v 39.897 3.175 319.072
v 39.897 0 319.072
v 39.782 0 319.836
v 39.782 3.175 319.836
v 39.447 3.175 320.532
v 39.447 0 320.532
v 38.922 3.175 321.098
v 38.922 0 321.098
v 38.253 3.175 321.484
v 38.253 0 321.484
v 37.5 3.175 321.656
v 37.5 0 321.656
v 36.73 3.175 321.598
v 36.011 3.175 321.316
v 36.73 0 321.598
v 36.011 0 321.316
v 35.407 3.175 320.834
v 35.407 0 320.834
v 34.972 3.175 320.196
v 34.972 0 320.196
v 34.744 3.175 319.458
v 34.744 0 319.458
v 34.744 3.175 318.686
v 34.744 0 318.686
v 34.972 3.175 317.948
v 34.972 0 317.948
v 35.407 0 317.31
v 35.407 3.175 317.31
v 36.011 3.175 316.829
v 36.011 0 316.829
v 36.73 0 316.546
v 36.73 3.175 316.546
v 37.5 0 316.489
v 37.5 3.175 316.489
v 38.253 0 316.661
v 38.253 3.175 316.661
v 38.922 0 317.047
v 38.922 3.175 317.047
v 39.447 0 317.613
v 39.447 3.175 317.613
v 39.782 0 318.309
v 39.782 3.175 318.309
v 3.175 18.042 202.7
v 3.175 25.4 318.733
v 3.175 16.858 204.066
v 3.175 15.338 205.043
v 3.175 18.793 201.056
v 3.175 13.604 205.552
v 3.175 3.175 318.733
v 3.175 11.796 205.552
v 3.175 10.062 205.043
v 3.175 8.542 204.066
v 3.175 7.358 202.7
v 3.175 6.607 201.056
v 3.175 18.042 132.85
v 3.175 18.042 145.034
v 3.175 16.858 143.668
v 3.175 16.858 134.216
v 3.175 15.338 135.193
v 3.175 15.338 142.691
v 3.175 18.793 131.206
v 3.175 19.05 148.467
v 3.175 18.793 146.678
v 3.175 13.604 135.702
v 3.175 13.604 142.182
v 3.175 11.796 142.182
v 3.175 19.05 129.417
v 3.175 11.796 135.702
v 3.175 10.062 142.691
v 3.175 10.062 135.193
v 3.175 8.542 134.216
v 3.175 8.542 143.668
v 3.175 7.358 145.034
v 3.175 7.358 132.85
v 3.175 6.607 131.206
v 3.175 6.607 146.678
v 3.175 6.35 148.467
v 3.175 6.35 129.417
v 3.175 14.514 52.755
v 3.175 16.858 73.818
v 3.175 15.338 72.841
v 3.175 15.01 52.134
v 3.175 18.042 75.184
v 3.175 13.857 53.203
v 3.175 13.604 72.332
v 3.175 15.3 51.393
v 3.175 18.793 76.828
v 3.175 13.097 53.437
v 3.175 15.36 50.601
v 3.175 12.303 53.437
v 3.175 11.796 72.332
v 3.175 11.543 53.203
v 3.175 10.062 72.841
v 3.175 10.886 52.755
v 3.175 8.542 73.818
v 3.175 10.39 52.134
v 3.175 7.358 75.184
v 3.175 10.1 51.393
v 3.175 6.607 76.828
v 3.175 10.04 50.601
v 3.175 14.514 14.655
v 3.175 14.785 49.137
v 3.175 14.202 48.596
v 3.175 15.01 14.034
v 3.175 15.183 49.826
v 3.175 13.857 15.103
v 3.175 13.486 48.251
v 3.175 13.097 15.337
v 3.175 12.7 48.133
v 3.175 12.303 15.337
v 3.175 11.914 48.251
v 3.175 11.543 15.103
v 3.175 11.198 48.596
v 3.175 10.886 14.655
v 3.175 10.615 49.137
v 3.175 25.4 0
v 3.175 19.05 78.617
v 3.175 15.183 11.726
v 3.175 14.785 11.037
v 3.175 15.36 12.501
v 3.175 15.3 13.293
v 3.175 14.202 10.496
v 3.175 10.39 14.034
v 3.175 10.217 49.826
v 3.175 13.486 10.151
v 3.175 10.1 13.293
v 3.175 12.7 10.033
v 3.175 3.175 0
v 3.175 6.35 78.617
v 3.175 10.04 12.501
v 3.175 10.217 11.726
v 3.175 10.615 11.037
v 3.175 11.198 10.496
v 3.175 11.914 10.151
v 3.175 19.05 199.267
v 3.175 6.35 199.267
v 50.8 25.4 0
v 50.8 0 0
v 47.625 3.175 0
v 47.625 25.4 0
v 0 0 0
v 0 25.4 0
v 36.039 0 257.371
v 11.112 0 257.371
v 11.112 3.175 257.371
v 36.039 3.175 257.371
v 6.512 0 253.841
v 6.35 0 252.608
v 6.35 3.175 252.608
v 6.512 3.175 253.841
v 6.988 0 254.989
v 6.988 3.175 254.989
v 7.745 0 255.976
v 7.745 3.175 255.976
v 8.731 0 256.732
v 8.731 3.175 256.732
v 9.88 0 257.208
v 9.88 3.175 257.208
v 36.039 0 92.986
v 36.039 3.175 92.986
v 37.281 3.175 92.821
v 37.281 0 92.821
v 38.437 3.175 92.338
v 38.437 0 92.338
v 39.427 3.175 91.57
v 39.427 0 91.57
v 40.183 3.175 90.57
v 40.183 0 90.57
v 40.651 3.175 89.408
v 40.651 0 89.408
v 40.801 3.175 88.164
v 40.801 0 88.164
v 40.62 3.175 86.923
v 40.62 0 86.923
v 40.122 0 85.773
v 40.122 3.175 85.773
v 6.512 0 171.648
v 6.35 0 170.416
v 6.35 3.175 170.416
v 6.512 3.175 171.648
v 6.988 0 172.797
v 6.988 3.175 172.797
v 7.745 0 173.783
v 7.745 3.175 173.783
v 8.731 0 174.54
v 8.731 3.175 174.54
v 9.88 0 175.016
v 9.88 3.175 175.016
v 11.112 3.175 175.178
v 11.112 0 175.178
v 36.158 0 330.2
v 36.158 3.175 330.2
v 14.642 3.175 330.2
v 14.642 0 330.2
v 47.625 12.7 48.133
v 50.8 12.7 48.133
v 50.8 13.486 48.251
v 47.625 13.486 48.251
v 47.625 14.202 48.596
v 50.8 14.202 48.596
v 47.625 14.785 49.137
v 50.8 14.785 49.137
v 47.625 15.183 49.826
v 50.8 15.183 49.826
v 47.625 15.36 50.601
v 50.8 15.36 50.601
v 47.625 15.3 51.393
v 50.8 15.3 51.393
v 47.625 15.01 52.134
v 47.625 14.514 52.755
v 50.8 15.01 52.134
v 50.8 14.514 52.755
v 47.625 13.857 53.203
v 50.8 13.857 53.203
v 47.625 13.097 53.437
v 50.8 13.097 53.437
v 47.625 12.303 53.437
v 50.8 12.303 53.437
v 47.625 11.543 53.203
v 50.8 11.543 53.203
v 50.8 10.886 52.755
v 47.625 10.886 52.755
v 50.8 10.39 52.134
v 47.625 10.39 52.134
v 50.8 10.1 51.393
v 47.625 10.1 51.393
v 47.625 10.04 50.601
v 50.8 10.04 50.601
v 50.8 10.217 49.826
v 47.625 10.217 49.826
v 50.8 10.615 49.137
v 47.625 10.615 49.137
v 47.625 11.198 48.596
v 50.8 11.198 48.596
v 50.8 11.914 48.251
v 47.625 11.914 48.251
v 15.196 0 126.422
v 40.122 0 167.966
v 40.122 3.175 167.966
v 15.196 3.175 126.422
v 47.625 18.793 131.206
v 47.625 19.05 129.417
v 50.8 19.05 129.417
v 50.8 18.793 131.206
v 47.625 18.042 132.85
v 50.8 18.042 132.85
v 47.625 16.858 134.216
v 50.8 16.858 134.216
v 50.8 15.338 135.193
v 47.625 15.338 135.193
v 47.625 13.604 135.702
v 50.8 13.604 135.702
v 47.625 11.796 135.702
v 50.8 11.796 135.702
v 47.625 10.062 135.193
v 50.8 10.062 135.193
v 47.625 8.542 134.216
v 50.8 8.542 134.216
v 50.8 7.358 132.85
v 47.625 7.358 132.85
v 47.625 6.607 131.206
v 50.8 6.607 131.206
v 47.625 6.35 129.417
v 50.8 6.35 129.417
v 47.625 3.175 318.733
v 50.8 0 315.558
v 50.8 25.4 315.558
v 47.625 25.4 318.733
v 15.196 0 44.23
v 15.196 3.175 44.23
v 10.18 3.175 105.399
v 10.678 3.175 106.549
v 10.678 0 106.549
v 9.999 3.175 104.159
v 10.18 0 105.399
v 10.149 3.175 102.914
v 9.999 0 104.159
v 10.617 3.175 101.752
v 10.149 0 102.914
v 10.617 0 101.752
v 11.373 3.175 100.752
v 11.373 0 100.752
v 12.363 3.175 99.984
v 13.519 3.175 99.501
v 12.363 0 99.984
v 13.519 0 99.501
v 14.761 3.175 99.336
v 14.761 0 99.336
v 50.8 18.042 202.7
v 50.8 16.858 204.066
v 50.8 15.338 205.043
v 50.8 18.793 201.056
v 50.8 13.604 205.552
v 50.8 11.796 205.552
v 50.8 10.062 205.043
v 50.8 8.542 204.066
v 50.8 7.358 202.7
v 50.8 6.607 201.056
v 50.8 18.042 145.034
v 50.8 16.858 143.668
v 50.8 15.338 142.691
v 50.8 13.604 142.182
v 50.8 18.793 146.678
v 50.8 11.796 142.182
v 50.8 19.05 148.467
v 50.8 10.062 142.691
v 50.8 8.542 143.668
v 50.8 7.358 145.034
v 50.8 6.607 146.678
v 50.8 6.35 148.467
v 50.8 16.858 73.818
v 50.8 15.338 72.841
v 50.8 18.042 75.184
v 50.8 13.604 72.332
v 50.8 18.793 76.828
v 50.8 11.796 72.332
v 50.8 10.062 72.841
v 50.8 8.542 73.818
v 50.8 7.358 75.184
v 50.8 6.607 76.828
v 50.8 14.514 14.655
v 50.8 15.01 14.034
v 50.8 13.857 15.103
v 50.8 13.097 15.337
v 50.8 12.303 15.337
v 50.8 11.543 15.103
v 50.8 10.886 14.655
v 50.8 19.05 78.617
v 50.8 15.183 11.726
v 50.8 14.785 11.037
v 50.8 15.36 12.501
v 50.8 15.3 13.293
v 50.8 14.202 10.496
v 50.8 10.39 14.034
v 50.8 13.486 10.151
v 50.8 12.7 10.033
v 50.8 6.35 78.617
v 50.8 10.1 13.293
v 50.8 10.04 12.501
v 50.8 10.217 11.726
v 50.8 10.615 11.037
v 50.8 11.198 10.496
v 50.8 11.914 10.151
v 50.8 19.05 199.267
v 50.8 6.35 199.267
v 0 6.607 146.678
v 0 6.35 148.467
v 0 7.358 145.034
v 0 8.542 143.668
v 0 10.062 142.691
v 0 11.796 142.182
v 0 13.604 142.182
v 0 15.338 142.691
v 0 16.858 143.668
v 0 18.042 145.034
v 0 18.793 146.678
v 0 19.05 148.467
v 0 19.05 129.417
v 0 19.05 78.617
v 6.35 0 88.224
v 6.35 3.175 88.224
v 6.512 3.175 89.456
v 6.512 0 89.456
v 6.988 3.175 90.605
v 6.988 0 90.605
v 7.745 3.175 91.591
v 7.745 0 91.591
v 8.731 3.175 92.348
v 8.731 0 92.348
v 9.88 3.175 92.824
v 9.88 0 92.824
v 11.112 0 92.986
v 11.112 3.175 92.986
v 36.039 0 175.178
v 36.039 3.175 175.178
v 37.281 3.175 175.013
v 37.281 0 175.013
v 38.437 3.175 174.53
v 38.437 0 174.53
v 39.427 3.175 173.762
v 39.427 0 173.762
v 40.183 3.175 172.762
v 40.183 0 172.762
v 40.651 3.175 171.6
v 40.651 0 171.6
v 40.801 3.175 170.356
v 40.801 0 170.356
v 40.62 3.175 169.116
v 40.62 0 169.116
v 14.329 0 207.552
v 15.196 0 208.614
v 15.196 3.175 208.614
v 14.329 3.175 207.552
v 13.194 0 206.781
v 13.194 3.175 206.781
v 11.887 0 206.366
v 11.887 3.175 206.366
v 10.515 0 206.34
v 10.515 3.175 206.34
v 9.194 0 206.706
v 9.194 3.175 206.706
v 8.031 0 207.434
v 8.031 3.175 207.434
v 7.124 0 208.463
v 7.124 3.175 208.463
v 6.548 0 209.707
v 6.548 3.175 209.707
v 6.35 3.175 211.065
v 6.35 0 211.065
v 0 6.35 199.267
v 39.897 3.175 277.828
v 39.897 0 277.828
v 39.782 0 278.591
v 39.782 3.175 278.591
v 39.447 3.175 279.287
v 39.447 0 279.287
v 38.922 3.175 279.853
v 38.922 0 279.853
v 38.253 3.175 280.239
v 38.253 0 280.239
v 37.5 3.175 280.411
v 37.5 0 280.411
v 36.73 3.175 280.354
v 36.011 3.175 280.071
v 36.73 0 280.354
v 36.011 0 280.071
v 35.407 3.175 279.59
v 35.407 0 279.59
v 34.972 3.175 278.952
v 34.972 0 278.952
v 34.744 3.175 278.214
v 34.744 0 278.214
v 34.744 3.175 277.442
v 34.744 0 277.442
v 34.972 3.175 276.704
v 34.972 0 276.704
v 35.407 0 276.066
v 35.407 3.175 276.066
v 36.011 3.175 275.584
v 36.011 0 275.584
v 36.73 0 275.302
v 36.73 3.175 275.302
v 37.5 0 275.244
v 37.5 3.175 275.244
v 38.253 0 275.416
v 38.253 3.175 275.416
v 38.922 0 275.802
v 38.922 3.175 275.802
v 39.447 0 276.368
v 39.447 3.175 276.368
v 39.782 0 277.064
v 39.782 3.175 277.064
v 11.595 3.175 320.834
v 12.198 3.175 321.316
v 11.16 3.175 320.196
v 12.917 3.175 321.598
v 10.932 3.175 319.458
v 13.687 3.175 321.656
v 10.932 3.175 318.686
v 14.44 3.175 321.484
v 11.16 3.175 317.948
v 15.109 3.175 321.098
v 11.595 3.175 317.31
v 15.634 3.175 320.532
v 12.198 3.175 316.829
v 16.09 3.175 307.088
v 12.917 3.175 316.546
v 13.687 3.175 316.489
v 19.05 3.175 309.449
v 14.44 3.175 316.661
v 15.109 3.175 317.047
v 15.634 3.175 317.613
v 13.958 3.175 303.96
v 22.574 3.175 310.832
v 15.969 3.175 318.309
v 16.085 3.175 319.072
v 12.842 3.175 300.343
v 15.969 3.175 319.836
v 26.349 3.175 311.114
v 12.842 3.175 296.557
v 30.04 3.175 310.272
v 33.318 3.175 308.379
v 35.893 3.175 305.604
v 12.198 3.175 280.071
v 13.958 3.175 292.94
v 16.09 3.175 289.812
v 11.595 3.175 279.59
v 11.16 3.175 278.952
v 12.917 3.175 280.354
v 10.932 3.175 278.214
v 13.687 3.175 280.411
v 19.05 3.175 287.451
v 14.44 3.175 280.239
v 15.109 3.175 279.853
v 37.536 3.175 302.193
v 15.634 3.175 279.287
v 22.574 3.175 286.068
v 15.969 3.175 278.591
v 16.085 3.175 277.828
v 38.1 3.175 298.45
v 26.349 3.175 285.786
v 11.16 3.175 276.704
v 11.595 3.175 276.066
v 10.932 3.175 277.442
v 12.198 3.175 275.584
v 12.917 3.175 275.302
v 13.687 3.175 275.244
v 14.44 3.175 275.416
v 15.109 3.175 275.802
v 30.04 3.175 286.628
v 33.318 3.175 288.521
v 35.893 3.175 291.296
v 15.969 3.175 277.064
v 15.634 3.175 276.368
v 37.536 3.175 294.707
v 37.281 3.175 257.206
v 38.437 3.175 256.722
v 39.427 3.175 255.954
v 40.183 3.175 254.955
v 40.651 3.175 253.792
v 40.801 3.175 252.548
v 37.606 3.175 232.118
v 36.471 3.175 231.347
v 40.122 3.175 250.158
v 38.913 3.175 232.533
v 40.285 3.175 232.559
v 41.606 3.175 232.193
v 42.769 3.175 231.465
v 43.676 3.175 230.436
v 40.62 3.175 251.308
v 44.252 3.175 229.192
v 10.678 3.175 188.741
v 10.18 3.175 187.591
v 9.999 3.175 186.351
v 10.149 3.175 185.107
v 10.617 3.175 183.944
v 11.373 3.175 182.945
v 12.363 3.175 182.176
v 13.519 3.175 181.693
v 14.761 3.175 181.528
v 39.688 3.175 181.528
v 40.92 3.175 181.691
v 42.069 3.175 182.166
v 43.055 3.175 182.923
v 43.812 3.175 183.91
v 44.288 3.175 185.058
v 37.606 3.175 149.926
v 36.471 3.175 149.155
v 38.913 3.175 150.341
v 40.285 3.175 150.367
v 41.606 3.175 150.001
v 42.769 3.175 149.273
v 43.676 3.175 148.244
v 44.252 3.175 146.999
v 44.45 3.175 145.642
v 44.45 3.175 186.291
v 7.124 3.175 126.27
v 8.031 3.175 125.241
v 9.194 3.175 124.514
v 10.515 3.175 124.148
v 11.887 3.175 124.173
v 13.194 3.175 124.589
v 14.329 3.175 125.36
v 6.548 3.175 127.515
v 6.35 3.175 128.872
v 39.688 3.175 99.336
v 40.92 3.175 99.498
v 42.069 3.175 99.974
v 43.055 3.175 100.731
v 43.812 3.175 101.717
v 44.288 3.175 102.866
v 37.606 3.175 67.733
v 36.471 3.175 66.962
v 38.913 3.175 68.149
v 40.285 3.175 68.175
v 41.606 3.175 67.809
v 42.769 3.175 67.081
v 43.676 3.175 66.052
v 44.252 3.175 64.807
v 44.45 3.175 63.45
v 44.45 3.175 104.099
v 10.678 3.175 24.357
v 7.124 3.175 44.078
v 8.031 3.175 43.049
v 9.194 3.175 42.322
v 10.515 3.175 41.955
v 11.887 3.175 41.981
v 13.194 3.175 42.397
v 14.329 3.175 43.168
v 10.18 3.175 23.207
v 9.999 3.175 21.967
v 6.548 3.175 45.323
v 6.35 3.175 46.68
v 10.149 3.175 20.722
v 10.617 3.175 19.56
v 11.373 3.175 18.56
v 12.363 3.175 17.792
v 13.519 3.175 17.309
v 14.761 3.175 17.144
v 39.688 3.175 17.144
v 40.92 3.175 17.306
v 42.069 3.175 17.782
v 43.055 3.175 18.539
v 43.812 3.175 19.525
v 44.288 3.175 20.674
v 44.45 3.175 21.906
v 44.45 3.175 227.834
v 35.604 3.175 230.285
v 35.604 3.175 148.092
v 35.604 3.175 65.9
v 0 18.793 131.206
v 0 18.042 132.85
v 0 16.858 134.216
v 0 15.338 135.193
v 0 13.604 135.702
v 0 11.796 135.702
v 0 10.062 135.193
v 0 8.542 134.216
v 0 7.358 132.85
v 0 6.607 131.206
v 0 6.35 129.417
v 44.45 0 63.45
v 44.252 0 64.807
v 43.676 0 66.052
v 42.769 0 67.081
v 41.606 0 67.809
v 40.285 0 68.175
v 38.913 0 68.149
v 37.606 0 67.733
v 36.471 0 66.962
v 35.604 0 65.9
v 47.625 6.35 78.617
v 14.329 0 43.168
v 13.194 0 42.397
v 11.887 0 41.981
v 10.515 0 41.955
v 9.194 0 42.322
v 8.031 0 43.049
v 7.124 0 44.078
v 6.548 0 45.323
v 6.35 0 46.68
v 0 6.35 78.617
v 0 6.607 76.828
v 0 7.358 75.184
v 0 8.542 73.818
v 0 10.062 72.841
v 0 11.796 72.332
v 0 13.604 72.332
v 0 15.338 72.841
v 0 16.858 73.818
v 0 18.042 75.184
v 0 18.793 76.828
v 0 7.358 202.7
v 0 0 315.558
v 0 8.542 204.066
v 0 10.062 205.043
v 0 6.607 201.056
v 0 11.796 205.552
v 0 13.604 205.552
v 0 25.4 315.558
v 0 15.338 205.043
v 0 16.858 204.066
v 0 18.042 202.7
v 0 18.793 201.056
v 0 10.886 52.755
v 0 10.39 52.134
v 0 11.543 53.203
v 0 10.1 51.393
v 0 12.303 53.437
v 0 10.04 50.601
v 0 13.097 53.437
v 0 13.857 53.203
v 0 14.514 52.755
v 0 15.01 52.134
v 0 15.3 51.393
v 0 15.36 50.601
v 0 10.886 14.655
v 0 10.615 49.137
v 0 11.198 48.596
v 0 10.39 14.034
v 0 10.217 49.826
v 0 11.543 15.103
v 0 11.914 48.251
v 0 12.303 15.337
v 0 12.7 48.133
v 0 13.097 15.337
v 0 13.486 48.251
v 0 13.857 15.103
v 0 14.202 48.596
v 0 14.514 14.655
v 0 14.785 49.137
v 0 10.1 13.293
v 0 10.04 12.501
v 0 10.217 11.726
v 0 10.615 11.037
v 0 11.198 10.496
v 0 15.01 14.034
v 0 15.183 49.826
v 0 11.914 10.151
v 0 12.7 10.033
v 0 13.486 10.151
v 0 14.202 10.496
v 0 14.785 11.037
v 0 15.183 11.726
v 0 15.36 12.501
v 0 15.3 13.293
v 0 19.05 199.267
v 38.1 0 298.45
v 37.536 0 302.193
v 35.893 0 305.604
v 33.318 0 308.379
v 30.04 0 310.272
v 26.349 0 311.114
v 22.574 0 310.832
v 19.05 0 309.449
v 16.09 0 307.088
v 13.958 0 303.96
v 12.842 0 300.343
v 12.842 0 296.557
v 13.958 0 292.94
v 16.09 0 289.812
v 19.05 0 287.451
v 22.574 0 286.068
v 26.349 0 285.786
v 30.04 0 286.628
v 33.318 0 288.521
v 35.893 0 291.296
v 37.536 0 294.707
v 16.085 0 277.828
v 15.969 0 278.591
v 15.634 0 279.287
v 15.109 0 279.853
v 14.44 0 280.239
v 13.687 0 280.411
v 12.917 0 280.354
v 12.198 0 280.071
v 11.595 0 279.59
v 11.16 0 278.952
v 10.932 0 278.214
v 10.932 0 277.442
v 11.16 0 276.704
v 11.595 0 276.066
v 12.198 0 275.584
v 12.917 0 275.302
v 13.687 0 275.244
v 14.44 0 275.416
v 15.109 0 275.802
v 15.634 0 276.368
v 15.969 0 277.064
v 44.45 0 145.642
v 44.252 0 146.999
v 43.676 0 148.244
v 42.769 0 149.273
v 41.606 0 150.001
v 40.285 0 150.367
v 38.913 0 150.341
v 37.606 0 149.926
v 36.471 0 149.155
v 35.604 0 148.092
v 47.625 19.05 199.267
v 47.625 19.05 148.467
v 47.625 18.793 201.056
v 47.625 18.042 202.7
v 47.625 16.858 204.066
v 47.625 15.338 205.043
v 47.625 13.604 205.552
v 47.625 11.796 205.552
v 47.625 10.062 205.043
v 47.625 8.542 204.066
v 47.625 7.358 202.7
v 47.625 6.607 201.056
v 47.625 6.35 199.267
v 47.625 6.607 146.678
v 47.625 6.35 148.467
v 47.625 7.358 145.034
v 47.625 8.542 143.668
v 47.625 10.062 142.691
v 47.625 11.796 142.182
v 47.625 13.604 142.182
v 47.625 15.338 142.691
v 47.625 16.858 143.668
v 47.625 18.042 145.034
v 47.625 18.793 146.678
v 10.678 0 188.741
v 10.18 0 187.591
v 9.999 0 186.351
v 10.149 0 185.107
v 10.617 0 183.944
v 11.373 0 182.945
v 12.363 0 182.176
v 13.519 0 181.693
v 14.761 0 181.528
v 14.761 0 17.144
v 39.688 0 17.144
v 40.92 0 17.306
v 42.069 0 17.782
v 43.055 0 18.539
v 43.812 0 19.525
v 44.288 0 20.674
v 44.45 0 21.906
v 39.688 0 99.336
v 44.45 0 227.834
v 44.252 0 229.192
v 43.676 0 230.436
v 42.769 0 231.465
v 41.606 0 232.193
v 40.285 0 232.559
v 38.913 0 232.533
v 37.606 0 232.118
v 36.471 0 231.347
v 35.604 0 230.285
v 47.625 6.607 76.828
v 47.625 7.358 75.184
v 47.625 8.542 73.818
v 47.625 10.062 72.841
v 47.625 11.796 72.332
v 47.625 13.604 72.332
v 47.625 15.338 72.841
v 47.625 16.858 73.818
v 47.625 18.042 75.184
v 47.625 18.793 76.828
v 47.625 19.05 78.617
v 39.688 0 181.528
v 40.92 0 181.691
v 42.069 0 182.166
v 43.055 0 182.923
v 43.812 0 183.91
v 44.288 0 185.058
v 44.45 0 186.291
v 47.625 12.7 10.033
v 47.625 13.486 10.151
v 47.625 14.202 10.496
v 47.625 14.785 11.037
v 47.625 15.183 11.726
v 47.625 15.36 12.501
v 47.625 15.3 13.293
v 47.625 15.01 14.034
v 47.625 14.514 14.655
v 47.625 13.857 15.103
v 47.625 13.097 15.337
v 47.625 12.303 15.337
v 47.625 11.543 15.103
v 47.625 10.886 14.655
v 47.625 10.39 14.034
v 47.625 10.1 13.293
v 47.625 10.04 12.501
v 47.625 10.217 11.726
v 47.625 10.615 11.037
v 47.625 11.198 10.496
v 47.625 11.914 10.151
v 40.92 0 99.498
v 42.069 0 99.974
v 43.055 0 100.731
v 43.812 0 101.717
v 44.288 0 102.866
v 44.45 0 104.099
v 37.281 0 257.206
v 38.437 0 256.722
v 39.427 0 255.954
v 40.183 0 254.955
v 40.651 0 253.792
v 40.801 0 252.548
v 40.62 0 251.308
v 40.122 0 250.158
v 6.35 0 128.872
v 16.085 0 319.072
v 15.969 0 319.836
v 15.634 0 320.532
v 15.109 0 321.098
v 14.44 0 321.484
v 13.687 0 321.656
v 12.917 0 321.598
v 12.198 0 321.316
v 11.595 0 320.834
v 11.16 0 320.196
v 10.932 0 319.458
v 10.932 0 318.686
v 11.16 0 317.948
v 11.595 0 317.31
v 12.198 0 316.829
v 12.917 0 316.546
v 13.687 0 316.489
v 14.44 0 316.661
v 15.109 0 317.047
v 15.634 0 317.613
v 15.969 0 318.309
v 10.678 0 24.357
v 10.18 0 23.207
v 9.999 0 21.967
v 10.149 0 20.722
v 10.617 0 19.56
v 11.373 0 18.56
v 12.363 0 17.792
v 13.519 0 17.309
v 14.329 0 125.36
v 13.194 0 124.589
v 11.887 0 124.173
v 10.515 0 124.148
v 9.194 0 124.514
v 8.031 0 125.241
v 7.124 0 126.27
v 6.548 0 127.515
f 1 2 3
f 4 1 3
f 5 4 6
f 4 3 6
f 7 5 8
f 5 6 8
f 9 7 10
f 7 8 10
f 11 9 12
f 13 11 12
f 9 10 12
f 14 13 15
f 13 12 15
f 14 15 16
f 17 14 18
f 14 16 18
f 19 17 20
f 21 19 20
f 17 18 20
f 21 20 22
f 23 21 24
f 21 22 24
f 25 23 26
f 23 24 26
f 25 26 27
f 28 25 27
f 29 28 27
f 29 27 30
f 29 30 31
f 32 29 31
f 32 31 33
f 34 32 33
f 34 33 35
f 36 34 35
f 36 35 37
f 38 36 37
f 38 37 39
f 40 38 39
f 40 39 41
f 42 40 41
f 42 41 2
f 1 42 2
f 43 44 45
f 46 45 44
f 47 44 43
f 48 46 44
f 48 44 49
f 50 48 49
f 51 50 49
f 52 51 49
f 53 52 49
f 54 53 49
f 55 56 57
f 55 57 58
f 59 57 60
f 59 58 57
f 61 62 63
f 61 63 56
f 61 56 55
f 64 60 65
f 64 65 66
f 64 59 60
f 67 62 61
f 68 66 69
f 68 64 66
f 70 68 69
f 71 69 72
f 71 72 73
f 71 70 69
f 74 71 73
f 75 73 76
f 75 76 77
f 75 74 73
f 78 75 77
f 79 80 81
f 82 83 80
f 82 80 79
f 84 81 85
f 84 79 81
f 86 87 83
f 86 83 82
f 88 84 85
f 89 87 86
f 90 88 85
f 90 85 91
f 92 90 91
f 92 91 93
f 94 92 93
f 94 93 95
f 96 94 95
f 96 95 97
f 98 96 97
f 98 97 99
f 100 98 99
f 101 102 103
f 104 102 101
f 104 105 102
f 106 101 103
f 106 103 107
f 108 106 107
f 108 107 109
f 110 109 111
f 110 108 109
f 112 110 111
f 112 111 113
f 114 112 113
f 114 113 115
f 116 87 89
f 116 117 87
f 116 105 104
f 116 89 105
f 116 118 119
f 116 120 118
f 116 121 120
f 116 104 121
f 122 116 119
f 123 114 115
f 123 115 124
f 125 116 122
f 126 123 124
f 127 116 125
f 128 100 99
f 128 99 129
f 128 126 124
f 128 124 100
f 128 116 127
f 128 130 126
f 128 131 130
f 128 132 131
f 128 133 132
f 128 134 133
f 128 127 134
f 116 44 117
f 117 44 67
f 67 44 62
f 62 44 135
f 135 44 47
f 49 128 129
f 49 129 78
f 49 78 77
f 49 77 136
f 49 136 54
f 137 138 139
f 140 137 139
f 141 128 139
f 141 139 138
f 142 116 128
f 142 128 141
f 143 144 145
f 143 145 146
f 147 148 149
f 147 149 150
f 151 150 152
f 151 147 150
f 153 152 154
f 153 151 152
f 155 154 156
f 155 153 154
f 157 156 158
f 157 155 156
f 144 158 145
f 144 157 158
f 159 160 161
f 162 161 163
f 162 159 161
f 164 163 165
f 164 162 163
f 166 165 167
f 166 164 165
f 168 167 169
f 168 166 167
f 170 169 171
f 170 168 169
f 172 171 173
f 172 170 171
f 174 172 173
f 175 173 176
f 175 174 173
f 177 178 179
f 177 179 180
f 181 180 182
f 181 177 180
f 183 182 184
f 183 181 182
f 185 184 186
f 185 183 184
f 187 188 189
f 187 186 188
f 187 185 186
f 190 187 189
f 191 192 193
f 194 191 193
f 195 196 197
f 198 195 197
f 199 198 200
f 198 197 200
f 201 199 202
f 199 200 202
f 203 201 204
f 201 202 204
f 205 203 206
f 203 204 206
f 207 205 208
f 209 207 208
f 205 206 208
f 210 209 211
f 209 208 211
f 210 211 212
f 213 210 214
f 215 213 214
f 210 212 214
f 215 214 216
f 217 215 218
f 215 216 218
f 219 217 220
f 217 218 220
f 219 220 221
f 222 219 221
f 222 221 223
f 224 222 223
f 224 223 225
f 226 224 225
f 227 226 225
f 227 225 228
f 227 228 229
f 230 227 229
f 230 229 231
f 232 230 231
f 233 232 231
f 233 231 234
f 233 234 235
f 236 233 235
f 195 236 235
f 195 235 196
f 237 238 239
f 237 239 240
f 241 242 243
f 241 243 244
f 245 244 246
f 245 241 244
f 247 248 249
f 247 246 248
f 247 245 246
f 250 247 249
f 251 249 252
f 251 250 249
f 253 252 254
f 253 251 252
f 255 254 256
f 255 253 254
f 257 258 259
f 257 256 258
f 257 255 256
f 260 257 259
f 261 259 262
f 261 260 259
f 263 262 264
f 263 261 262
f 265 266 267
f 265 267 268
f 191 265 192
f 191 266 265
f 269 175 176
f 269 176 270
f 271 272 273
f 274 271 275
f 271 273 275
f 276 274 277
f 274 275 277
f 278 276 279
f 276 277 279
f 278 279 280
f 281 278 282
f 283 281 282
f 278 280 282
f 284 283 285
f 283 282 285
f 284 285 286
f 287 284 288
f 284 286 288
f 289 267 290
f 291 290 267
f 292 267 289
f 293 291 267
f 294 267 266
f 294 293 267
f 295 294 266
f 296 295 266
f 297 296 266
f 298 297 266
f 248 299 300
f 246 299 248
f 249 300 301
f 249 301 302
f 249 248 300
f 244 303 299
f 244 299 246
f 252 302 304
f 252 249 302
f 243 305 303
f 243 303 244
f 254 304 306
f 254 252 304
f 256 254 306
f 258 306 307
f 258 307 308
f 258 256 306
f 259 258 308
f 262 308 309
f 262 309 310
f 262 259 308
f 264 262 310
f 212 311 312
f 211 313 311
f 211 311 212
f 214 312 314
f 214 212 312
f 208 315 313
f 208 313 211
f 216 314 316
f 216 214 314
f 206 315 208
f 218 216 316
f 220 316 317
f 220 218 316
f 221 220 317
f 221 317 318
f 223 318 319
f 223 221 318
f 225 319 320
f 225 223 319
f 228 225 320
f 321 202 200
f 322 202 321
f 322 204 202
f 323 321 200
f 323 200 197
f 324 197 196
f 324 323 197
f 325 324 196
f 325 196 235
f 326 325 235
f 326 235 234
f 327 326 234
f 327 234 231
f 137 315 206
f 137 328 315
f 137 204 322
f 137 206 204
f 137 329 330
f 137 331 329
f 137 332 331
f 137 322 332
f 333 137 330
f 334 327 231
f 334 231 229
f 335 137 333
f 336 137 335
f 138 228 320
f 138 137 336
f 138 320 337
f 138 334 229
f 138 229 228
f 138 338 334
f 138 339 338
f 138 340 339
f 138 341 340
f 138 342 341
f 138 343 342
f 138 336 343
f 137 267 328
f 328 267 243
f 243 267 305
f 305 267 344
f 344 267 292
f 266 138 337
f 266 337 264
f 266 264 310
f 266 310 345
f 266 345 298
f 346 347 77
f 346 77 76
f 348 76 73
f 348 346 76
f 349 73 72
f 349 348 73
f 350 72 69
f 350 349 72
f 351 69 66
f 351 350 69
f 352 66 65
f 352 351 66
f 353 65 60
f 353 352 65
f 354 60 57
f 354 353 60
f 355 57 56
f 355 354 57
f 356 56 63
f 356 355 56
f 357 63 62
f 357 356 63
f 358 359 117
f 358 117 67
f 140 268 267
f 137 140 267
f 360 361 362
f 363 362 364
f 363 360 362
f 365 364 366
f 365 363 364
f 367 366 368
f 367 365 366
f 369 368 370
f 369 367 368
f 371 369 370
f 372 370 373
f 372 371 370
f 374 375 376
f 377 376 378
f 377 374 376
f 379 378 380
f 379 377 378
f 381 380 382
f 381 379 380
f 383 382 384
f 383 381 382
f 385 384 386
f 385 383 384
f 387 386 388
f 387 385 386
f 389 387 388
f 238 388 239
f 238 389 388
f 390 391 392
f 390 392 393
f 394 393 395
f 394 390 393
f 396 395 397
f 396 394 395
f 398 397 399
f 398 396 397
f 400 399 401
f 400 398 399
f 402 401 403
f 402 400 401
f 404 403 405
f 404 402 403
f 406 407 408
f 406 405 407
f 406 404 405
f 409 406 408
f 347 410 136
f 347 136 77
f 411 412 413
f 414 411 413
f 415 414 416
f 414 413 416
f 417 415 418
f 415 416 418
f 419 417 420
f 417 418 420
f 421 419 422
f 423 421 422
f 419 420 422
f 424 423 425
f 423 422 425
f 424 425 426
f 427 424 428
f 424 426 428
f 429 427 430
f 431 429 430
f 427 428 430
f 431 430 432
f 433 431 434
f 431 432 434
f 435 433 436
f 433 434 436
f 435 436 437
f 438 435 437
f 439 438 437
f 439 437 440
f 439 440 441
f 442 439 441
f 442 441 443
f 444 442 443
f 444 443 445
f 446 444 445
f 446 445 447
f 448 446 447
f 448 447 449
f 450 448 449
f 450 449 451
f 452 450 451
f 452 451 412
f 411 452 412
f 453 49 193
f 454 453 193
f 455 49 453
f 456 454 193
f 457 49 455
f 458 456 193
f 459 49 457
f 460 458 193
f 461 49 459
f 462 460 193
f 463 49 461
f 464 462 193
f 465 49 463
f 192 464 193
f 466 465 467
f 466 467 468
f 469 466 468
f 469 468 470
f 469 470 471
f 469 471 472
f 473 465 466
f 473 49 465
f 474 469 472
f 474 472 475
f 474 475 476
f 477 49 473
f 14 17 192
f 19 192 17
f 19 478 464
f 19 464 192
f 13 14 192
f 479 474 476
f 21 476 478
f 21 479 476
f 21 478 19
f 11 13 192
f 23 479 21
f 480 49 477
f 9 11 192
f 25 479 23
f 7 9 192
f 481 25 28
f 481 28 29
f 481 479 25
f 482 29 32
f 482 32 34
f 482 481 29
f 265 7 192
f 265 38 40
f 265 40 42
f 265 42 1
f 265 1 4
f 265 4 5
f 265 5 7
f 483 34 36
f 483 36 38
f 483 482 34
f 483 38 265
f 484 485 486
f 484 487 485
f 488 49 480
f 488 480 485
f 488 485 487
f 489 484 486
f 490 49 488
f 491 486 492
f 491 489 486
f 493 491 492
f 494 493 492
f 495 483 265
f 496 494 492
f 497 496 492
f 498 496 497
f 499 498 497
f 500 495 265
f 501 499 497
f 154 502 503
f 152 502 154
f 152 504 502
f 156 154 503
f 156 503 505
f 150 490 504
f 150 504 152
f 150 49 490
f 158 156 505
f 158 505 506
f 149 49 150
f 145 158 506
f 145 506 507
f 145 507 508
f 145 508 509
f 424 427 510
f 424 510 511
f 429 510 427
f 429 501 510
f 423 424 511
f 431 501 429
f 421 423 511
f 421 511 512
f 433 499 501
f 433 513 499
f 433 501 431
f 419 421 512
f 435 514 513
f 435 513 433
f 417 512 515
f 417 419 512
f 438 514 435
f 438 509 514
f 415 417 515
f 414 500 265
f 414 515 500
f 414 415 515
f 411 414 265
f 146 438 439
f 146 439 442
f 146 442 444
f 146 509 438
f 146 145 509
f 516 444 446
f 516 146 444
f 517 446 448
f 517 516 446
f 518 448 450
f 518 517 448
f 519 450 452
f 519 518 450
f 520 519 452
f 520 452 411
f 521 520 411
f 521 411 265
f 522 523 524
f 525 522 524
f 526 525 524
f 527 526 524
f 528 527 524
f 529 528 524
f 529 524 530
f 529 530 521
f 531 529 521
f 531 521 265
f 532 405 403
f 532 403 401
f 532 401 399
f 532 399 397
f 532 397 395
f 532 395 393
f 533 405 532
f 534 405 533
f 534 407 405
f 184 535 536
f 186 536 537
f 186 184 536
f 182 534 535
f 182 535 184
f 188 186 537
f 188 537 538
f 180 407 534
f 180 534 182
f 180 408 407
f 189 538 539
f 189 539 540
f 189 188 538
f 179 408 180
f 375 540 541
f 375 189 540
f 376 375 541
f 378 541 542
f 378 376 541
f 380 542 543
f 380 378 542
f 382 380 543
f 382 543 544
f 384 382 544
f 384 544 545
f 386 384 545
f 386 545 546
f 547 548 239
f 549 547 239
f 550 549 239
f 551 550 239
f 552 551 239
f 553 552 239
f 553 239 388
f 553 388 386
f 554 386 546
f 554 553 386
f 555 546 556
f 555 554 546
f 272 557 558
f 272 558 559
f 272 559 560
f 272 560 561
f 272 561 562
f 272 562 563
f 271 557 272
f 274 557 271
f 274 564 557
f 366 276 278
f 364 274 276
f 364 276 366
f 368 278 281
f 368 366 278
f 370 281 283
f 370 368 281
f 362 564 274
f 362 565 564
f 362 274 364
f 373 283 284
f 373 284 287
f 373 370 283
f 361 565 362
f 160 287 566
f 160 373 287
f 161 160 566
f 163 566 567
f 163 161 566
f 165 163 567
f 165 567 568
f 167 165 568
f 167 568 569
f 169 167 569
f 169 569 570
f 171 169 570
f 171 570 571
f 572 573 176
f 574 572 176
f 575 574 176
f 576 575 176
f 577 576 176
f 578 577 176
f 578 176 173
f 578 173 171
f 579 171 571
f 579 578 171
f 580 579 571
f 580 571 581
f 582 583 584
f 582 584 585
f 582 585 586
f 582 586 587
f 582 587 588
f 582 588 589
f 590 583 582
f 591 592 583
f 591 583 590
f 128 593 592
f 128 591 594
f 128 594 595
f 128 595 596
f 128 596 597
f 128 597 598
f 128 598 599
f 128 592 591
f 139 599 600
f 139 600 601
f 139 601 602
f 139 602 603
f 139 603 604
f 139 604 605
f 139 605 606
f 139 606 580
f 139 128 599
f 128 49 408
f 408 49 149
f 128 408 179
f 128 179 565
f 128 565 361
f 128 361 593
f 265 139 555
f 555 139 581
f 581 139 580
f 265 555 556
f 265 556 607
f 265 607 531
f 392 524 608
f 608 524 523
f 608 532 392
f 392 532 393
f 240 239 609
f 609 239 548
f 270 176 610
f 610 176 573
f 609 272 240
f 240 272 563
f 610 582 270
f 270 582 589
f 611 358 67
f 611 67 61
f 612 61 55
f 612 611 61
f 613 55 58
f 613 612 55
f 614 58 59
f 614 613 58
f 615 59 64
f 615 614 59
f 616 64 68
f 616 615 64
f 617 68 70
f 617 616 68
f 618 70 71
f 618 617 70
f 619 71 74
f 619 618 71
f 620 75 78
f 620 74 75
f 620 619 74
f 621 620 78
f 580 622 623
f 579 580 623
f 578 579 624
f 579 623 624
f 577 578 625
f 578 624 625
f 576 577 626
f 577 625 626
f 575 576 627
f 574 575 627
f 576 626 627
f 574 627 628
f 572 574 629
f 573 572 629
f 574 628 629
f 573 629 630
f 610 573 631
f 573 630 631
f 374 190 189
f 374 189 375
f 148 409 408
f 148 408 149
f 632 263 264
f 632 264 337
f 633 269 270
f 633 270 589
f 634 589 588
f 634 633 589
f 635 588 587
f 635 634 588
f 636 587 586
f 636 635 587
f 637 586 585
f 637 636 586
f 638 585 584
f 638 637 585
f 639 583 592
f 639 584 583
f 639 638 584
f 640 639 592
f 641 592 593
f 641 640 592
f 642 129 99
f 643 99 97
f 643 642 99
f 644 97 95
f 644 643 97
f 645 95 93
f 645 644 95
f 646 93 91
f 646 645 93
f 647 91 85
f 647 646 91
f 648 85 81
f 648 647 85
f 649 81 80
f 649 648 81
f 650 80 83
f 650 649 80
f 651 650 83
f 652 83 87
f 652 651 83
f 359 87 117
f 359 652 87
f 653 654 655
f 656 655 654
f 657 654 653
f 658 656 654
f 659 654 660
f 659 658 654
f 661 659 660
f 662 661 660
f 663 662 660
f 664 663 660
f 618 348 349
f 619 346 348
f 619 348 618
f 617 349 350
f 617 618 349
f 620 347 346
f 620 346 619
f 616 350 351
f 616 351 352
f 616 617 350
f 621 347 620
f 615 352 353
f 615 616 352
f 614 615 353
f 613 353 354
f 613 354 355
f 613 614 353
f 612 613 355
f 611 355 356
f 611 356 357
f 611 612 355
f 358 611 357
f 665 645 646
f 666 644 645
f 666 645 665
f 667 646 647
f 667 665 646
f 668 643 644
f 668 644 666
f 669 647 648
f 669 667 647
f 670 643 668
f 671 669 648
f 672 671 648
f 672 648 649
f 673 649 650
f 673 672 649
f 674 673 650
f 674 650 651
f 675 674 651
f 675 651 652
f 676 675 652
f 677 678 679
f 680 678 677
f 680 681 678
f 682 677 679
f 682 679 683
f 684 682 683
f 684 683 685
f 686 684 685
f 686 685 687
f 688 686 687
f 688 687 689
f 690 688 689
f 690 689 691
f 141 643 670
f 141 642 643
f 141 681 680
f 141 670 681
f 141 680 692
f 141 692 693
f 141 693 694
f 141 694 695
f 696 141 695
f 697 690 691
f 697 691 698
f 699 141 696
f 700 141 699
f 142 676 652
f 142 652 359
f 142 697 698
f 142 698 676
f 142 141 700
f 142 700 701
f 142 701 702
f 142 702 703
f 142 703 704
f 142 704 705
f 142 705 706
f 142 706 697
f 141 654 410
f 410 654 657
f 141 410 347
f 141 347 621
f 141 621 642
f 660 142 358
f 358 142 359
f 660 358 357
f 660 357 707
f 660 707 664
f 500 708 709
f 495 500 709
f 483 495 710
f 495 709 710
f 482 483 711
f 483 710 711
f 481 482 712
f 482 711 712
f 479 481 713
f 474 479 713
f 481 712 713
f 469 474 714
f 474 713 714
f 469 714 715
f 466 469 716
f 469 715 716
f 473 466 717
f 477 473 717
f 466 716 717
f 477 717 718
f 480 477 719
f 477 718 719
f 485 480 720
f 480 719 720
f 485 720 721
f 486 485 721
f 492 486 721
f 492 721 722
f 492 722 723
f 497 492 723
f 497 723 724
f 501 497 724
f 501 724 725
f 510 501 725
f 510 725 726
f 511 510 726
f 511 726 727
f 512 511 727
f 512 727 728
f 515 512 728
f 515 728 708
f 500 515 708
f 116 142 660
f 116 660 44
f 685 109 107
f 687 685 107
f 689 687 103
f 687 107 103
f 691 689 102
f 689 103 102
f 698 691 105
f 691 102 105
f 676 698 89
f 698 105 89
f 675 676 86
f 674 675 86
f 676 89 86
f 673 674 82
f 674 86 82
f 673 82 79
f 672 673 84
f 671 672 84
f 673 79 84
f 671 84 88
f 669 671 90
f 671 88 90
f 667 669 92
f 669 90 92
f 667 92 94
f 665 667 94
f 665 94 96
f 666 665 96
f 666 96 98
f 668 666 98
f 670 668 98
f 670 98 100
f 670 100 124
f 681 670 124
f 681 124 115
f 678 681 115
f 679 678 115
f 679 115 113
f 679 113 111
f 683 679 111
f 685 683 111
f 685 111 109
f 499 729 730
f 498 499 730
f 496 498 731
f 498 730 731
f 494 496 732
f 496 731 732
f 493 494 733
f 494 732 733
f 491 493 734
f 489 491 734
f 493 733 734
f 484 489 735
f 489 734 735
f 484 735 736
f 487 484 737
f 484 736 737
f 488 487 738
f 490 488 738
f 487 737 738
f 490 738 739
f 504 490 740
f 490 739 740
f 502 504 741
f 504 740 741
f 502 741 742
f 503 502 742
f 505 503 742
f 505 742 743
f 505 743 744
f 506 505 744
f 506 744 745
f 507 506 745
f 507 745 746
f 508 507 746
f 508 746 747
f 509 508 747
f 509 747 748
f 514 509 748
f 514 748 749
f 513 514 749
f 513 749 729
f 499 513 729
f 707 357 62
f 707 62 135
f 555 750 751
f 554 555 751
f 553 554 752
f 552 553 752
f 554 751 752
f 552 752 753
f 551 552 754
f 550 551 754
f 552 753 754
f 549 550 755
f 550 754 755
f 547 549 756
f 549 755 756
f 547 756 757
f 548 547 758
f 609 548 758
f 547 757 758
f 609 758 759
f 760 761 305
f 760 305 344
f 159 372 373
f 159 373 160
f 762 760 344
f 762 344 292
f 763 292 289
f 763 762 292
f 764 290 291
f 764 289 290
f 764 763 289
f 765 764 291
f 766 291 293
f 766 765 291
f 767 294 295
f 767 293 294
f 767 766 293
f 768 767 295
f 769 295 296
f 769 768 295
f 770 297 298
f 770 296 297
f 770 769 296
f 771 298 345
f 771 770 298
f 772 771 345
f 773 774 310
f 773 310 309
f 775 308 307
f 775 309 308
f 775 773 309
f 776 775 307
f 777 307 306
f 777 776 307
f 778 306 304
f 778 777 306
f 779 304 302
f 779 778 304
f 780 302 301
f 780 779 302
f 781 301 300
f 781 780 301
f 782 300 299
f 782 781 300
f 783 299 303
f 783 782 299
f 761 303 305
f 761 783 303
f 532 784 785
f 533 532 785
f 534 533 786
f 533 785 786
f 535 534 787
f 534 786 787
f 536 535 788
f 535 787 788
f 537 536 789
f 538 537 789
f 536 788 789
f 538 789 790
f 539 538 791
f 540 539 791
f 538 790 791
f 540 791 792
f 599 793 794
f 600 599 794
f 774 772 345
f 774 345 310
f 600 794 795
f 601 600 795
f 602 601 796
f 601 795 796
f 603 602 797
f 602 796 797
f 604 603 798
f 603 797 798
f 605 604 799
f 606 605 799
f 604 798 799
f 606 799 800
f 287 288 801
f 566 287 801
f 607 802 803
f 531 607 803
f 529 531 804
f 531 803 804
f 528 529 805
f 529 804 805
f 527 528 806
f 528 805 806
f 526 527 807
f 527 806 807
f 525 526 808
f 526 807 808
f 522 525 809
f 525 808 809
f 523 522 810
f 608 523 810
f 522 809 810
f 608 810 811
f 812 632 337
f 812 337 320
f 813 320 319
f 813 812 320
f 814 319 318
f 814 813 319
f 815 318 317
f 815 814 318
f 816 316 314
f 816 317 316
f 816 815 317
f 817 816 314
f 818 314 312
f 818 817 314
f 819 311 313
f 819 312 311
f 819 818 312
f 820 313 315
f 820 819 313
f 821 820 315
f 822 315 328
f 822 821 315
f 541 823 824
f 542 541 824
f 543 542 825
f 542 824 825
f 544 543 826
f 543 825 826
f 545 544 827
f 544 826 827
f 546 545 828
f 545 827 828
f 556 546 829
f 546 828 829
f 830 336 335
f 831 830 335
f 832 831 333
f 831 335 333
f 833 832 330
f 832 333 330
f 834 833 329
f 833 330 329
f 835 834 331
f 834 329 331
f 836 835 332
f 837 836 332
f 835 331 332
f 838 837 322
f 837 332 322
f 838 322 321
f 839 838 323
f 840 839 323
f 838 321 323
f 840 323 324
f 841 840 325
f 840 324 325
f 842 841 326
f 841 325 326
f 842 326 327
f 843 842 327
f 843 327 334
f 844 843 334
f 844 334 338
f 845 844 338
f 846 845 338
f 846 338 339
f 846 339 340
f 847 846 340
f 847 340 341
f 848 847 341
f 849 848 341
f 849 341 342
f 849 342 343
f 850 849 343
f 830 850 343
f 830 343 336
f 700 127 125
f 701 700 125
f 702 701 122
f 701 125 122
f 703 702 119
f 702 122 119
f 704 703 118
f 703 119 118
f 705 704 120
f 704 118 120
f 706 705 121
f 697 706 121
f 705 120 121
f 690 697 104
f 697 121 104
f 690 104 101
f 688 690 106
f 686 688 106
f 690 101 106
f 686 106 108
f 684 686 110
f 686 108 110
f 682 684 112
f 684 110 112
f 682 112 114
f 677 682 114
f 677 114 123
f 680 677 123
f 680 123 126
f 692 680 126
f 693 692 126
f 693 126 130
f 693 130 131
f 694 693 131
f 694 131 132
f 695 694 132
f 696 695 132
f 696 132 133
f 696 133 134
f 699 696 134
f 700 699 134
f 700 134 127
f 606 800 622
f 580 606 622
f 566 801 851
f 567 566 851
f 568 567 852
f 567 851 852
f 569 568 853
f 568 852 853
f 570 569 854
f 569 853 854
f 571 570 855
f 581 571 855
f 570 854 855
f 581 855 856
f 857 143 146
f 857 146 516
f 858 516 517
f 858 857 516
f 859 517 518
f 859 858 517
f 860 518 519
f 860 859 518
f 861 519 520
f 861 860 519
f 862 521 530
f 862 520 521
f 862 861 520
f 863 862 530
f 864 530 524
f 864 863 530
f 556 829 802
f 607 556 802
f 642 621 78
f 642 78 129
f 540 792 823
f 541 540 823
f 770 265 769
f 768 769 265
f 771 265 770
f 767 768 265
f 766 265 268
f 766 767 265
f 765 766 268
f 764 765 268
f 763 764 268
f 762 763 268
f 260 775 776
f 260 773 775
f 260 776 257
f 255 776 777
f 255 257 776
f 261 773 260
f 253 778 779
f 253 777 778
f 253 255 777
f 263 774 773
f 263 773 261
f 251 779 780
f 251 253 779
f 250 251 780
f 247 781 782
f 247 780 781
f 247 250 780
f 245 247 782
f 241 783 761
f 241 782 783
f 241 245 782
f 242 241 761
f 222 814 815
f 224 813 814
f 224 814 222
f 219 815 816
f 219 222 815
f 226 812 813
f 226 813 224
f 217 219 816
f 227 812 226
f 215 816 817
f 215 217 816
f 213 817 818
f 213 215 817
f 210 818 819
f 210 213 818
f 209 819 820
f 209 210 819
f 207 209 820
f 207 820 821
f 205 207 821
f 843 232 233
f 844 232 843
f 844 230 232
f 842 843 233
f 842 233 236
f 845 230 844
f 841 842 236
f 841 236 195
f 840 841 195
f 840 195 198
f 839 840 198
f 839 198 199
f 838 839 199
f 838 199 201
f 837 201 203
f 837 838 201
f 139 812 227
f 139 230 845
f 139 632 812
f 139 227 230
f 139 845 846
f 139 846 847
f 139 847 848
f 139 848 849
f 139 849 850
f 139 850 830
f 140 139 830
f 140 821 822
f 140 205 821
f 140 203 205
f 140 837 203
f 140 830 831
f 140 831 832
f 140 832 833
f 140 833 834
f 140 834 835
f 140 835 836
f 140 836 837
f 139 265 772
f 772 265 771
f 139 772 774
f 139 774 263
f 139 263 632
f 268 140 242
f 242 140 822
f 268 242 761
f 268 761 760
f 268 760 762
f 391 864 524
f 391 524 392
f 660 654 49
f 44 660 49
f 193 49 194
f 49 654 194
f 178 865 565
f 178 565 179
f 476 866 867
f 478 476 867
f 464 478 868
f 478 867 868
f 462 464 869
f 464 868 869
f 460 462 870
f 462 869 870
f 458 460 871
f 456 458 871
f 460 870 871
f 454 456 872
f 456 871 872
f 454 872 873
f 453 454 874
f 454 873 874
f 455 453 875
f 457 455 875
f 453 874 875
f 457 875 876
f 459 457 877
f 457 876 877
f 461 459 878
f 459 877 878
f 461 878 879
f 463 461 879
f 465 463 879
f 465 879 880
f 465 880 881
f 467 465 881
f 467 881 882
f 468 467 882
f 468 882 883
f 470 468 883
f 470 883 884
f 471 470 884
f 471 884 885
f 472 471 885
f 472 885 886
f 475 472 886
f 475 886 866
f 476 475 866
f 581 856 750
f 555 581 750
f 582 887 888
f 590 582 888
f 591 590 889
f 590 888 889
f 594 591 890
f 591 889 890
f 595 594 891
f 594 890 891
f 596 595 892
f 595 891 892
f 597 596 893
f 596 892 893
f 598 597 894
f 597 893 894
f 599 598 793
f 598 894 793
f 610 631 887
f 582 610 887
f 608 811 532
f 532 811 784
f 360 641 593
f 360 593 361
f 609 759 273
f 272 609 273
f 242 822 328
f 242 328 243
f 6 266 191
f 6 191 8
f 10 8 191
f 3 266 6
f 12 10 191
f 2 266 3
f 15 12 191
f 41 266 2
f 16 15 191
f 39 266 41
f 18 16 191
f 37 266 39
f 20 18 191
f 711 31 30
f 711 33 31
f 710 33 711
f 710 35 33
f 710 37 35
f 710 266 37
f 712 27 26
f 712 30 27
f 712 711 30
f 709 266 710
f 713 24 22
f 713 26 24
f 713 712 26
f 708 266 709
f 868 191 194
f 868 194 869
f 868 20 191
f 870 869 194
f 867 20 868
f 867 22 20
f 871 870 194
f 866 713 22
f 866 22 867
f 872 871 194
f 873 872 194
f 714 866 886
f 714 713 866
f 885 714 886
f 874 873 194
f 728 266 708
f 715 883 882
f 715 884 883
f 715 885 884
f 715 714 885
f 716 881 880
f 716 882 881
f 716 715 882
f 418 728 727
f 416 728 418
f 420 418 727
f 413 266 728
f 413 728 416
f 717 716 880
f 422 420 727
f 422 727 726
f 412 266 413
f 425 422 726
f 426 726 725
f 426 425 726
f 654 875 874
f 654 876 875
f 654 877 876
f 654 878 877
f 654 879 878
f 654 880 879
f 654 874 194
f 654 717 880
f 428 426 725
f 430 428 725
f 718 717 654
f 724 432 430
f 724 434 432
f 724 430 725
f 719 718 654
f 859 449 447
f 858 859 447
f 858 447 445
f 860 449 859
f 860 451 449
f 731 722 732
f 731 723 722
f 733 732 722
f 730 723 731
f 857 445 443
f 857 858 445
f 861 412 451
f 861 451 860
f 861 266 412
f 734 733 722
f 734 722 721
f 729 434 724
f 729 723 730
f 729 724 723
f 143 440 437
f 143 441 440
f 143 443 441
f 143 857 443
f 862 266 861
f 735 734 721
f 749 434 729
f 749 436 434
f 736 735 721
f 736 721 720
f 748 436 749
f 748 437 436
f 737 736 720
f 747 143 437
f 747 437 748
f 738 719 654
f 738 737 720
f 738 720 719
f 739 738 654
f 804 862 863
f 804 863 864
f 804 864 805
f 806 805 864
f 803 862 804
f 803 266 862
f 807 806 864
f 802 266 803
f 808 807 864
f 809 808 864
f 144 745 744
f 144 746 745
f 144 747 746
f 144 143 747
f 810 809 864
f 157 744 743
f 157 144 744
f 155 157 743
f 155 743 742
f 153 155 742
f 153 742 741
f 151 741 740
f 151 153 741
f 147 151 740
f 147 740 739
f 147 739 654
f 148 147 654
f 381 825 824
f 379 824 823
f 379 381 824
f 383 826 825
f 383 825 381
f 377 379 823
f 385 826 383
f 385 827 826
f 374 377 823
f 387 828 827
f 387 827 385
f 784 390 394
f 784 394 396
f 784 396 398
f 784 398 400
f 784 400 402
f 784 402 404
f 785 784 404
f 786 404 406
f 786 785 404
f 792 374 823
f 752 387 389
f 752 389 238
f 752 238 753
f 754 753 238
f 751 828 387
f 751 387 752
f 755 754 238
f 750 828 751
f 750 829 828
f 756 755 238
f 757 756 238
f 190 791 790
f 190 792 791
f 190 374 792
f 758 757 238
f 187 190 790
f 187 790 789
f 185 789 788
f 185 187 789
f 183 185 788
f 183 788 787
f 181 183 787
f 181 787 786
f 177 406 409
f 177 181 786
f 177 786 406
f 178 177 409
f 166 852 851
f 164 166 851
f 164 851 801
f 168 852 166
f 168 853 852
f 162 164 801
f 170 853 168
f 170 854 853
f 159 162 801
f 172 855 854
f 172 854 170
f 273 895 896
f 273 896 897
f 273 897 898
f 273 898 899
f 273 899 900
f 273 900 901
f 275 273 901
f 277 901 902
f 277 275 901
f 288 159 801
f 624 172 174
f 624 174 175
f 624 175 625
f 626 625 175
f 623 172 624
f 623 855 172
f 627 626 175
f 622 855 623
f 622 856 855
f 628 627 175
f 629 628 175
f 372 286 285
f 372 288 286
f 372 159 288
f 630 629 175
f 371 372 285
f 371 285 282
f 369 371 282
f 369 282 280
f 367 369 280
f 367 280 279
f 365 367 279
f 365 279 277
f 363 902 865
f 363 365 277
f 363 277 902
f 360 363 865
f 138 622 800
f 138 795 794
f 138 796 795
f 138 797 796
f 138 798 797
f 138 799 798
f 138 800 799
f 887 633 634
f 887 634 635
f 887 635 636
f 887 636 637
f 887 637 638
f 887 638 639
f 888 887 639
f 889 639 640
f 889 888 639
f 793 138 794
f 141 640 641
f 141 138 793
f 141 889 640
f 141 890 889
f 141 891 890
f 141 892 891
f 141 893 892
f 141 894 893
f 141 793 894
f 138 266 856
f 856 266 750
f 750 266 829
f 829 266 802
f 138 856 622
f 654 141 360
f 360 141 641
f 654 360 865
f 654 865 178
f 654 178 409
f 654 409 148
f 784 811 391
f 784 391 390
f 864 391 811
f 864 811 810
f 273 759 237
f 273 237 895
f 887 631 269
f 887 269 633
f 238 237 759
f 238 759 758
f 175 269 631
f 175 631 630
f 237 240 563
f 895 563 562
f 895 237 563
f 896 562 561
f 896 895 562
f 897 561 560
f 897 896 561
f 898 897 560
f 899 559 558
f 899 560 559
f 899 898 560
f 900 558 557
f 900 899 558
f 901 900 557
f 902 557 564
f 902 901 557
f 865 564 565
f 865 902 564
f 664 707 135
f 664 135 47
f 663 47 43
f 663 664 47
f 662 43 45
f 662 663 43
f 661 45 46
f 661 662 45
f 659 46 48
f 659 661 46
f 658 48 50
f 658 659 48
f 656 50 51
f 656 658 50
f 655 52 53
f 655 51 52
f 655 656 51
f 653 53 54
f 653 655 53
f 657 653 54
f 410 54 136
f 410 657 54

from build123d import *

# Parameters (mm, degrees)
BOSS_EXTRUDE1_DEPTH = 330.2
CUT_EXTRUDE1_REACH  = 27.4
SKETCH2_R           = 12.7
SKETCH3_R           = 2.667
CUT_EXTRUDE2_DEPTH  = 51.8
CUT_EXTRUDE3_REACH  = 27.4
SKETCH4_R           = 2.5908
CUT_EXTRUDE4_REACH  = 27.4
CUT_EXTRUDE5_DEPTH  = 51.8
CUT_EXTRUDE6_DEPTH  = 26.4


with BuildPart() as part:
    # Sketch1 → Boss-Extrude1 (new body)
    with BuildSketch(Plane.XY):
        Polygon((47.625, 3.175), (47.625, 25.4), (50.8, 25.4), (50.8, 0), (0, 0), (0, 25.4), (3.175, 25.4), (3.175, 3.175), align=None)
    extrude(amount=BOSS_EXTRUDE1_DEPTH)

    # Sketch2 → Cut-Extrude1 (cut, up to next)
    with BuildSketch(Plane.XZ, mode=Mode.PRIVATE) as cut_extrude1_sk1:
        with Locations((25.4, 298.45)):
            Circle(SKETCH2_R)
    cut_extrude1_tool1 = extrude(cut_extrude1_sk1.sketch, amount=-CUT_EXTRUDE1_REACH, mode=Mode.PRIVATE) & part.part
    add(cut_extrude1_tool1.solids().sort_by_distance((25.4, 0, 298.45))[0], mode=Mode.SUBTRACT)

    # Sketch3 → Cut-Extrude2 (cut, through all)
    with BuildSketch(Plane(origin=(50.8, 0, 0), x_dir=(0, 0, -1), z_dir=(1, 0, 0))):
        with Locations((-12.7, 12.7)):
            Circle(SKETCH3_R)
        with Locations((-50.8, 12.7)):
            Circle(SKETCH3_R)
    extrude(amount=-CUT_EXTRUDE2_DEPTH, mode=Mode.SUBTRACT)

    # Sketch4 → Cut-Extrude3 (cut, up to next)
    with BuildSketch(Plane.XZ, mode=Mode.PRIVATE) as cut_extrude3_sk1:
        with Locations((13.49375, 277.827770072)):
            Circle(SKETCH4_R)
    cut_extrude3_tool1 = extrude(cut_extrude3_sk1.sketch, amount=-CUT_EXTRUDE3_REACH, mode=Mode.PRIVATE) & part.part
    add(cut_extrude3_tool1.solids().sort_by_distance((13.49375, 0, 277.82777))[0], mode=Mode.SUBTRACT)
    # Sketch4 → Cut-Extrude3 (cut, up to next)
    with BuildSketch(Plane.XZ, mode=Mode.PRIVATE) as cut_extrude3_sk2:
        with Locations((37.30625, 277.827770072)):
            Circle(SKETCH4_R)
    cut_extrude3_tool2 = extrude(cut_extrude3_sk2.sketch, amount=-CUT_EXTRUDE3_REACH, mode=Mode.PRIVATE) & part.part
    add(cut_extrude3_tool2.solids().sort_by_distance((37.30625, 0, 277.82777))[0], mode=Mode.SUBTRACT)
    # Sketch4 → Cut-Extrude3 (cut, up to next)
    with BuildSketch(Plane.XZ, mode=Mode.PRIVATE) as cut_extrude3_sk3:
        with Locations((13.49375, 319.072229928)):
            Circle(SKETCH4_R)
    cut_extrude3_tool3 = extrude(cut_extrude3_sk3.sketch, amount=-CUT_EXTRUDE3_REACH, mode=Mode.PRIVATE) & part.part
    add(cut_extrude3_tool3.solids().sort_by_distance((13.49375, 0, 319.07223))[0], mode=Mode.SUBTRACT)
    # Sketch4 → Cut-Extrude3 (cut, up to next)
    with BuildSketch(Plane.XZ, mode=Mode.PRIVATE) as cut_extrude3_sk4:
        with Locations((37.30625, 319.072229928)):
            Circle(SKETCH4_R)
    cut_extrude3_tool4 = extrude(cut_extrude3_sk4.sketch, amount=-CUT_EXTRUDE3_REACH, mode=Mode.PRIVATE) & part.part
    add(cut_extrude3_tool4.solids().sort_by_distance((37.30625, 0, 319.07223))[0], mode=Mode.SUBTRACT)

    # Sketch5 → Cut-Extrude4 (cut, up to next)
    with BuildSketch(Plane.XZ, mode=Mode.PRIVATE) as cut_extrude4_sk1:
        with BuildLine():
            Line((40.122328379, 85.773383183), (15.196310059, 44.230019316))
            ThreePointArc((15.196310059, 44.230019316), (9.841228816, 42.090613006), (6.35, 46.680305352))
            Line((6.35, 46.680305352), (6.35, 88.223669219))
            ThreePointArc((6.35, 88.223669219), (7.744903955, 91.591265264), (11.1125, 92.986169219))
            Line((11.1125, 92.986169219), (36.03851832, 92.986169219))
            ThreePointArc((36.03851832, 92.986169219), (40.182845376, 90.570147325), (40.122328379, 85.773383183))
        make_face()
    cut_extrude4_tool1 = extrude(cut_extrude4_sk1.sketch, amount=-CUT_EXTRUDE4_REACH, mode=Mode.PRIVATE) & part.part
    add(cut_extrude4_tool1.solids().sort_by_distance((19.256233, 0, 73.00095))[0], mode=Mode.SUBTRACT)
    # Sketch5 → Cut-Extrude4 (cut, up to next)
    with BuildSketch(Plane.XZ, mode=Mode.PRIVATE) as cut_extrude4_sk2:
        with BuildLine():
            Line((14.76148168, 17.143987708), (39.6875, 17.143987708))
            ThreePointArc((39.6875, 17.143987708), (43.055096045, 18.538891662), (44.45, 21.906487708))
            Line((44.45, 21.906487708), (44.45, 63.449851575))
            ThreePointArc((44.45, 63.449851575), (40.958771184, 68.03954392), (35.603689941, 65.90013761))
            Line((35.603689941, 65.90013761), (10.677671621, 24.356773743))
            ThreePointArc((10.677671621, 24.356773743), (10.617154624, 19.560009601), (14.76148168, 17.143987708))
        make_face()
    cut_extrude4_tool2 = extrude(cut_extrude4_sk2.sketch, amount=-CUT_EXTRUDE4_REACH, mode=Mode.PRIVATE) & part.part
    add(cut_extrude4_tool2.solids().sort_by_distance((31.543767, 0, 37.129207))[0], mode=Mode.SUBTRACT)
    # Sketch5 → Cut-Extrude4 (cut, up to next)
    with BuildSketch(Plane.XZ, mode=Mode.PRIVATE) as cut_extrude4_sk3:
        with BuildLine():
            Line((40.122328379, 167.965564694), (15.196310059, 126.422200827))
            ThreePointArc((15.196310059, 126.422200827), (9.841228816, 124.282794517), (6.35, 128.872486862))
            Line((6.35, 128.872486862), (6.35, 170.415850729))
            ThreePointArc((6.35, 170.415850729), (7.744903955, 173.783446775), (11.1125, 175.178350729))
            Line((11.1125, 175.178350729), (36.03851832, 175.178350729))
            ThreePointArc((36.03851832, 175.178350729), (40.182845376, 172.762328836), (40.122328379, 167.965564694))
        make_face()
    cut_extrude4_tool3 = extrude(cut_extrude4_sk3.sketch, amount=-CUT_EXTRUDE4_REACH, mode=Mode.PRIVATE) & part.part
    add(cut_extrude4_tool3.solids().sort_by_distance((19.256233, 0, 155.193132))[0], mode=Mode.SUBTRACT)
    # Sketch5 → Cut-Extrude4 (cut, up to next)
    with BuildSketch(Plane.XZ, mode=Mode.PRIVATE) as cut_extrude4_sk4:
        with BuildLine():
            Line((14.76148168, 99.336169219), (39.6875, 99.336169219))
            ThreePointArc((39.6875, 99.336169219), (43.055096045, 100.731073173), (44.45, 104.098669219))
            Line((44.45, 104.098669219), (44.45, 145.642033085))
            ThreePointArc((44.45, 145.642033085), (40.958771184, 150.231725431), (35.603689941, 148.092319121))
            Line((35.603689941, 148.092319121), (10.677671621, 106.548955254))
            ThreePointArc((10.677671621, 106.548955254), (10.617154624, 101.752191112), (14.76148168, 99.336169219))
        make_face()
    cut_extrude4_tool4 = extrude(cut_extrude4_sk4.sketch, amount=-CUT_EXTRUDE4_REACH, mode=Mode.PRIVATE) & part.part
    add(cut_extrude4_tool4.solids().sort_by_distance((31.543767, 0, 119.321388))[0], mode=Mode.SUBTRACT)
    # Sketch5 → Cut-Extrude4 (cut, up to next)
    with BuildSketch(Plane.XZ, mode=Mode.PRIVATE) as cut_extrude4_sk5:
        with BuildLine():
            Line((40.122328379, 250.157746205), (15.196310059, 208.614382338))
            ThreePointArc((15.196310059, 208.614382338), (9.841228816, 206.474976028), (6.35, 211.064668373))
            Line((6.35, 211.064668373), (6.35, 252.60803224))
            ThreePointArc((6.35, 252.60803224), (7.744903955, 255.975628285), (11.1125, 257.37053224))
            Line((11.1125, 257.37053224), (36.03851832, 257.37053224))
            ThreePointArc((36.03851832, 257.37053224), (40.182845376, 254.954510346), (40.122328379, 250.157746205))
        make_face()
    cut_extrude4_tool5 = extrude(cut_extrude4_sk5.sketch, amount=-CUT_EXTRUDE4_REACH, mode=Mode.PRIVATE) & part.part
    add(cut_extrude4_tool5.solids().sort_by_distance((19.256233, 0, 237.385313))[0], mode=Mode.SUBTRACT)
    # Sketch5 → Cut-Extrude4 (cut, up to next)
    with BuildSketch(Plane.XZ, mode=Mode.PRIVATE) as cut_extrude4_sk6:
        with BuildLine():
            Line((14.76148168, 181.528350729), (39.6875, 181.528350729))
            ThreePointArc((39.6875, 181.528350729), (43.055096045, 182.923254684), (44.45, 186.290850729))
            Line((44.45, 186.290850729), (44.45, 227.834214596))
            ThreePointArc((44.45, 227.834214596), (40.958771184, 232.423906942), (35.603689941, 230.284500631))
            Line((35.603689941, 230.284500631), (10.677671621, 188.741136765))
            ThreePointArc((10.677671621, 188.741136765), (10.617154624, 183.944372623), (14.76148168, 181.528350729))
        make_face()
    cut_extrude4_tool6 = extrude(cut_extrude4_sk6.sketch, amount=-CUT_EXTRUDE4_REACH, mode=Mode.PRIVATE) & part.part
    add(cut_extrude4_tool6.solids().sort_by_distance((31.543767, 0, 201.51357))[0], mode=Mode.SUBTRACT)

    # Sketch6 → Cut-Extrude5 (cut, through all)
    with BuildSketch(Plane.ZY):
        with BuildLine():
            Line((78.616971835, 19.05), (129.416971835, 19.05))
            ThreePointArc((129.416971835, 19.05), (135.766971835, 12.7), (129.416971835, 6.35))
            Line((129.416971835, 6.35), (78.616971835, 6.35))
            ThreePointArc((78.616971835, 6.35), (72.266971835, 12.7), (78.616971835, 19.05))
        make_face()
        with BuildLine():
            Line((148.466971835, 19.05), (199.266971835, 19.05))
            ThreePointArc((199.266971835, 19.05), (205.616971835, 12.7), (199.266971835, 6.35))
            Line((199.266971835, 6.35), (148.466971835, 6.35))
            ThreePointArc((148.466971835, 6.35), (142.116971835, 12.7), (148.466971835, 19.05))
        make_face()
    extrude(amount=-CUT_EXTRUDE5_DEPTH, mode=Mode.SUBTRACT)

    # Sketch7 → Cut-Extrude6 (cut, through all)
    with BuildSketch(Plane.XZ):
        Polygon((0, 330.2), (0, 315.558408634), (14.641591366, 330.2), align=None)
        Polygon((36.158408634, 330.2), (50.8, 330.2), (50.8, 315.558408634), align=None)
    extrude(amount=-CUT_EXTRUDE6_DEPTH, mode=Mode.SUBTRACT)


solid = part.part
